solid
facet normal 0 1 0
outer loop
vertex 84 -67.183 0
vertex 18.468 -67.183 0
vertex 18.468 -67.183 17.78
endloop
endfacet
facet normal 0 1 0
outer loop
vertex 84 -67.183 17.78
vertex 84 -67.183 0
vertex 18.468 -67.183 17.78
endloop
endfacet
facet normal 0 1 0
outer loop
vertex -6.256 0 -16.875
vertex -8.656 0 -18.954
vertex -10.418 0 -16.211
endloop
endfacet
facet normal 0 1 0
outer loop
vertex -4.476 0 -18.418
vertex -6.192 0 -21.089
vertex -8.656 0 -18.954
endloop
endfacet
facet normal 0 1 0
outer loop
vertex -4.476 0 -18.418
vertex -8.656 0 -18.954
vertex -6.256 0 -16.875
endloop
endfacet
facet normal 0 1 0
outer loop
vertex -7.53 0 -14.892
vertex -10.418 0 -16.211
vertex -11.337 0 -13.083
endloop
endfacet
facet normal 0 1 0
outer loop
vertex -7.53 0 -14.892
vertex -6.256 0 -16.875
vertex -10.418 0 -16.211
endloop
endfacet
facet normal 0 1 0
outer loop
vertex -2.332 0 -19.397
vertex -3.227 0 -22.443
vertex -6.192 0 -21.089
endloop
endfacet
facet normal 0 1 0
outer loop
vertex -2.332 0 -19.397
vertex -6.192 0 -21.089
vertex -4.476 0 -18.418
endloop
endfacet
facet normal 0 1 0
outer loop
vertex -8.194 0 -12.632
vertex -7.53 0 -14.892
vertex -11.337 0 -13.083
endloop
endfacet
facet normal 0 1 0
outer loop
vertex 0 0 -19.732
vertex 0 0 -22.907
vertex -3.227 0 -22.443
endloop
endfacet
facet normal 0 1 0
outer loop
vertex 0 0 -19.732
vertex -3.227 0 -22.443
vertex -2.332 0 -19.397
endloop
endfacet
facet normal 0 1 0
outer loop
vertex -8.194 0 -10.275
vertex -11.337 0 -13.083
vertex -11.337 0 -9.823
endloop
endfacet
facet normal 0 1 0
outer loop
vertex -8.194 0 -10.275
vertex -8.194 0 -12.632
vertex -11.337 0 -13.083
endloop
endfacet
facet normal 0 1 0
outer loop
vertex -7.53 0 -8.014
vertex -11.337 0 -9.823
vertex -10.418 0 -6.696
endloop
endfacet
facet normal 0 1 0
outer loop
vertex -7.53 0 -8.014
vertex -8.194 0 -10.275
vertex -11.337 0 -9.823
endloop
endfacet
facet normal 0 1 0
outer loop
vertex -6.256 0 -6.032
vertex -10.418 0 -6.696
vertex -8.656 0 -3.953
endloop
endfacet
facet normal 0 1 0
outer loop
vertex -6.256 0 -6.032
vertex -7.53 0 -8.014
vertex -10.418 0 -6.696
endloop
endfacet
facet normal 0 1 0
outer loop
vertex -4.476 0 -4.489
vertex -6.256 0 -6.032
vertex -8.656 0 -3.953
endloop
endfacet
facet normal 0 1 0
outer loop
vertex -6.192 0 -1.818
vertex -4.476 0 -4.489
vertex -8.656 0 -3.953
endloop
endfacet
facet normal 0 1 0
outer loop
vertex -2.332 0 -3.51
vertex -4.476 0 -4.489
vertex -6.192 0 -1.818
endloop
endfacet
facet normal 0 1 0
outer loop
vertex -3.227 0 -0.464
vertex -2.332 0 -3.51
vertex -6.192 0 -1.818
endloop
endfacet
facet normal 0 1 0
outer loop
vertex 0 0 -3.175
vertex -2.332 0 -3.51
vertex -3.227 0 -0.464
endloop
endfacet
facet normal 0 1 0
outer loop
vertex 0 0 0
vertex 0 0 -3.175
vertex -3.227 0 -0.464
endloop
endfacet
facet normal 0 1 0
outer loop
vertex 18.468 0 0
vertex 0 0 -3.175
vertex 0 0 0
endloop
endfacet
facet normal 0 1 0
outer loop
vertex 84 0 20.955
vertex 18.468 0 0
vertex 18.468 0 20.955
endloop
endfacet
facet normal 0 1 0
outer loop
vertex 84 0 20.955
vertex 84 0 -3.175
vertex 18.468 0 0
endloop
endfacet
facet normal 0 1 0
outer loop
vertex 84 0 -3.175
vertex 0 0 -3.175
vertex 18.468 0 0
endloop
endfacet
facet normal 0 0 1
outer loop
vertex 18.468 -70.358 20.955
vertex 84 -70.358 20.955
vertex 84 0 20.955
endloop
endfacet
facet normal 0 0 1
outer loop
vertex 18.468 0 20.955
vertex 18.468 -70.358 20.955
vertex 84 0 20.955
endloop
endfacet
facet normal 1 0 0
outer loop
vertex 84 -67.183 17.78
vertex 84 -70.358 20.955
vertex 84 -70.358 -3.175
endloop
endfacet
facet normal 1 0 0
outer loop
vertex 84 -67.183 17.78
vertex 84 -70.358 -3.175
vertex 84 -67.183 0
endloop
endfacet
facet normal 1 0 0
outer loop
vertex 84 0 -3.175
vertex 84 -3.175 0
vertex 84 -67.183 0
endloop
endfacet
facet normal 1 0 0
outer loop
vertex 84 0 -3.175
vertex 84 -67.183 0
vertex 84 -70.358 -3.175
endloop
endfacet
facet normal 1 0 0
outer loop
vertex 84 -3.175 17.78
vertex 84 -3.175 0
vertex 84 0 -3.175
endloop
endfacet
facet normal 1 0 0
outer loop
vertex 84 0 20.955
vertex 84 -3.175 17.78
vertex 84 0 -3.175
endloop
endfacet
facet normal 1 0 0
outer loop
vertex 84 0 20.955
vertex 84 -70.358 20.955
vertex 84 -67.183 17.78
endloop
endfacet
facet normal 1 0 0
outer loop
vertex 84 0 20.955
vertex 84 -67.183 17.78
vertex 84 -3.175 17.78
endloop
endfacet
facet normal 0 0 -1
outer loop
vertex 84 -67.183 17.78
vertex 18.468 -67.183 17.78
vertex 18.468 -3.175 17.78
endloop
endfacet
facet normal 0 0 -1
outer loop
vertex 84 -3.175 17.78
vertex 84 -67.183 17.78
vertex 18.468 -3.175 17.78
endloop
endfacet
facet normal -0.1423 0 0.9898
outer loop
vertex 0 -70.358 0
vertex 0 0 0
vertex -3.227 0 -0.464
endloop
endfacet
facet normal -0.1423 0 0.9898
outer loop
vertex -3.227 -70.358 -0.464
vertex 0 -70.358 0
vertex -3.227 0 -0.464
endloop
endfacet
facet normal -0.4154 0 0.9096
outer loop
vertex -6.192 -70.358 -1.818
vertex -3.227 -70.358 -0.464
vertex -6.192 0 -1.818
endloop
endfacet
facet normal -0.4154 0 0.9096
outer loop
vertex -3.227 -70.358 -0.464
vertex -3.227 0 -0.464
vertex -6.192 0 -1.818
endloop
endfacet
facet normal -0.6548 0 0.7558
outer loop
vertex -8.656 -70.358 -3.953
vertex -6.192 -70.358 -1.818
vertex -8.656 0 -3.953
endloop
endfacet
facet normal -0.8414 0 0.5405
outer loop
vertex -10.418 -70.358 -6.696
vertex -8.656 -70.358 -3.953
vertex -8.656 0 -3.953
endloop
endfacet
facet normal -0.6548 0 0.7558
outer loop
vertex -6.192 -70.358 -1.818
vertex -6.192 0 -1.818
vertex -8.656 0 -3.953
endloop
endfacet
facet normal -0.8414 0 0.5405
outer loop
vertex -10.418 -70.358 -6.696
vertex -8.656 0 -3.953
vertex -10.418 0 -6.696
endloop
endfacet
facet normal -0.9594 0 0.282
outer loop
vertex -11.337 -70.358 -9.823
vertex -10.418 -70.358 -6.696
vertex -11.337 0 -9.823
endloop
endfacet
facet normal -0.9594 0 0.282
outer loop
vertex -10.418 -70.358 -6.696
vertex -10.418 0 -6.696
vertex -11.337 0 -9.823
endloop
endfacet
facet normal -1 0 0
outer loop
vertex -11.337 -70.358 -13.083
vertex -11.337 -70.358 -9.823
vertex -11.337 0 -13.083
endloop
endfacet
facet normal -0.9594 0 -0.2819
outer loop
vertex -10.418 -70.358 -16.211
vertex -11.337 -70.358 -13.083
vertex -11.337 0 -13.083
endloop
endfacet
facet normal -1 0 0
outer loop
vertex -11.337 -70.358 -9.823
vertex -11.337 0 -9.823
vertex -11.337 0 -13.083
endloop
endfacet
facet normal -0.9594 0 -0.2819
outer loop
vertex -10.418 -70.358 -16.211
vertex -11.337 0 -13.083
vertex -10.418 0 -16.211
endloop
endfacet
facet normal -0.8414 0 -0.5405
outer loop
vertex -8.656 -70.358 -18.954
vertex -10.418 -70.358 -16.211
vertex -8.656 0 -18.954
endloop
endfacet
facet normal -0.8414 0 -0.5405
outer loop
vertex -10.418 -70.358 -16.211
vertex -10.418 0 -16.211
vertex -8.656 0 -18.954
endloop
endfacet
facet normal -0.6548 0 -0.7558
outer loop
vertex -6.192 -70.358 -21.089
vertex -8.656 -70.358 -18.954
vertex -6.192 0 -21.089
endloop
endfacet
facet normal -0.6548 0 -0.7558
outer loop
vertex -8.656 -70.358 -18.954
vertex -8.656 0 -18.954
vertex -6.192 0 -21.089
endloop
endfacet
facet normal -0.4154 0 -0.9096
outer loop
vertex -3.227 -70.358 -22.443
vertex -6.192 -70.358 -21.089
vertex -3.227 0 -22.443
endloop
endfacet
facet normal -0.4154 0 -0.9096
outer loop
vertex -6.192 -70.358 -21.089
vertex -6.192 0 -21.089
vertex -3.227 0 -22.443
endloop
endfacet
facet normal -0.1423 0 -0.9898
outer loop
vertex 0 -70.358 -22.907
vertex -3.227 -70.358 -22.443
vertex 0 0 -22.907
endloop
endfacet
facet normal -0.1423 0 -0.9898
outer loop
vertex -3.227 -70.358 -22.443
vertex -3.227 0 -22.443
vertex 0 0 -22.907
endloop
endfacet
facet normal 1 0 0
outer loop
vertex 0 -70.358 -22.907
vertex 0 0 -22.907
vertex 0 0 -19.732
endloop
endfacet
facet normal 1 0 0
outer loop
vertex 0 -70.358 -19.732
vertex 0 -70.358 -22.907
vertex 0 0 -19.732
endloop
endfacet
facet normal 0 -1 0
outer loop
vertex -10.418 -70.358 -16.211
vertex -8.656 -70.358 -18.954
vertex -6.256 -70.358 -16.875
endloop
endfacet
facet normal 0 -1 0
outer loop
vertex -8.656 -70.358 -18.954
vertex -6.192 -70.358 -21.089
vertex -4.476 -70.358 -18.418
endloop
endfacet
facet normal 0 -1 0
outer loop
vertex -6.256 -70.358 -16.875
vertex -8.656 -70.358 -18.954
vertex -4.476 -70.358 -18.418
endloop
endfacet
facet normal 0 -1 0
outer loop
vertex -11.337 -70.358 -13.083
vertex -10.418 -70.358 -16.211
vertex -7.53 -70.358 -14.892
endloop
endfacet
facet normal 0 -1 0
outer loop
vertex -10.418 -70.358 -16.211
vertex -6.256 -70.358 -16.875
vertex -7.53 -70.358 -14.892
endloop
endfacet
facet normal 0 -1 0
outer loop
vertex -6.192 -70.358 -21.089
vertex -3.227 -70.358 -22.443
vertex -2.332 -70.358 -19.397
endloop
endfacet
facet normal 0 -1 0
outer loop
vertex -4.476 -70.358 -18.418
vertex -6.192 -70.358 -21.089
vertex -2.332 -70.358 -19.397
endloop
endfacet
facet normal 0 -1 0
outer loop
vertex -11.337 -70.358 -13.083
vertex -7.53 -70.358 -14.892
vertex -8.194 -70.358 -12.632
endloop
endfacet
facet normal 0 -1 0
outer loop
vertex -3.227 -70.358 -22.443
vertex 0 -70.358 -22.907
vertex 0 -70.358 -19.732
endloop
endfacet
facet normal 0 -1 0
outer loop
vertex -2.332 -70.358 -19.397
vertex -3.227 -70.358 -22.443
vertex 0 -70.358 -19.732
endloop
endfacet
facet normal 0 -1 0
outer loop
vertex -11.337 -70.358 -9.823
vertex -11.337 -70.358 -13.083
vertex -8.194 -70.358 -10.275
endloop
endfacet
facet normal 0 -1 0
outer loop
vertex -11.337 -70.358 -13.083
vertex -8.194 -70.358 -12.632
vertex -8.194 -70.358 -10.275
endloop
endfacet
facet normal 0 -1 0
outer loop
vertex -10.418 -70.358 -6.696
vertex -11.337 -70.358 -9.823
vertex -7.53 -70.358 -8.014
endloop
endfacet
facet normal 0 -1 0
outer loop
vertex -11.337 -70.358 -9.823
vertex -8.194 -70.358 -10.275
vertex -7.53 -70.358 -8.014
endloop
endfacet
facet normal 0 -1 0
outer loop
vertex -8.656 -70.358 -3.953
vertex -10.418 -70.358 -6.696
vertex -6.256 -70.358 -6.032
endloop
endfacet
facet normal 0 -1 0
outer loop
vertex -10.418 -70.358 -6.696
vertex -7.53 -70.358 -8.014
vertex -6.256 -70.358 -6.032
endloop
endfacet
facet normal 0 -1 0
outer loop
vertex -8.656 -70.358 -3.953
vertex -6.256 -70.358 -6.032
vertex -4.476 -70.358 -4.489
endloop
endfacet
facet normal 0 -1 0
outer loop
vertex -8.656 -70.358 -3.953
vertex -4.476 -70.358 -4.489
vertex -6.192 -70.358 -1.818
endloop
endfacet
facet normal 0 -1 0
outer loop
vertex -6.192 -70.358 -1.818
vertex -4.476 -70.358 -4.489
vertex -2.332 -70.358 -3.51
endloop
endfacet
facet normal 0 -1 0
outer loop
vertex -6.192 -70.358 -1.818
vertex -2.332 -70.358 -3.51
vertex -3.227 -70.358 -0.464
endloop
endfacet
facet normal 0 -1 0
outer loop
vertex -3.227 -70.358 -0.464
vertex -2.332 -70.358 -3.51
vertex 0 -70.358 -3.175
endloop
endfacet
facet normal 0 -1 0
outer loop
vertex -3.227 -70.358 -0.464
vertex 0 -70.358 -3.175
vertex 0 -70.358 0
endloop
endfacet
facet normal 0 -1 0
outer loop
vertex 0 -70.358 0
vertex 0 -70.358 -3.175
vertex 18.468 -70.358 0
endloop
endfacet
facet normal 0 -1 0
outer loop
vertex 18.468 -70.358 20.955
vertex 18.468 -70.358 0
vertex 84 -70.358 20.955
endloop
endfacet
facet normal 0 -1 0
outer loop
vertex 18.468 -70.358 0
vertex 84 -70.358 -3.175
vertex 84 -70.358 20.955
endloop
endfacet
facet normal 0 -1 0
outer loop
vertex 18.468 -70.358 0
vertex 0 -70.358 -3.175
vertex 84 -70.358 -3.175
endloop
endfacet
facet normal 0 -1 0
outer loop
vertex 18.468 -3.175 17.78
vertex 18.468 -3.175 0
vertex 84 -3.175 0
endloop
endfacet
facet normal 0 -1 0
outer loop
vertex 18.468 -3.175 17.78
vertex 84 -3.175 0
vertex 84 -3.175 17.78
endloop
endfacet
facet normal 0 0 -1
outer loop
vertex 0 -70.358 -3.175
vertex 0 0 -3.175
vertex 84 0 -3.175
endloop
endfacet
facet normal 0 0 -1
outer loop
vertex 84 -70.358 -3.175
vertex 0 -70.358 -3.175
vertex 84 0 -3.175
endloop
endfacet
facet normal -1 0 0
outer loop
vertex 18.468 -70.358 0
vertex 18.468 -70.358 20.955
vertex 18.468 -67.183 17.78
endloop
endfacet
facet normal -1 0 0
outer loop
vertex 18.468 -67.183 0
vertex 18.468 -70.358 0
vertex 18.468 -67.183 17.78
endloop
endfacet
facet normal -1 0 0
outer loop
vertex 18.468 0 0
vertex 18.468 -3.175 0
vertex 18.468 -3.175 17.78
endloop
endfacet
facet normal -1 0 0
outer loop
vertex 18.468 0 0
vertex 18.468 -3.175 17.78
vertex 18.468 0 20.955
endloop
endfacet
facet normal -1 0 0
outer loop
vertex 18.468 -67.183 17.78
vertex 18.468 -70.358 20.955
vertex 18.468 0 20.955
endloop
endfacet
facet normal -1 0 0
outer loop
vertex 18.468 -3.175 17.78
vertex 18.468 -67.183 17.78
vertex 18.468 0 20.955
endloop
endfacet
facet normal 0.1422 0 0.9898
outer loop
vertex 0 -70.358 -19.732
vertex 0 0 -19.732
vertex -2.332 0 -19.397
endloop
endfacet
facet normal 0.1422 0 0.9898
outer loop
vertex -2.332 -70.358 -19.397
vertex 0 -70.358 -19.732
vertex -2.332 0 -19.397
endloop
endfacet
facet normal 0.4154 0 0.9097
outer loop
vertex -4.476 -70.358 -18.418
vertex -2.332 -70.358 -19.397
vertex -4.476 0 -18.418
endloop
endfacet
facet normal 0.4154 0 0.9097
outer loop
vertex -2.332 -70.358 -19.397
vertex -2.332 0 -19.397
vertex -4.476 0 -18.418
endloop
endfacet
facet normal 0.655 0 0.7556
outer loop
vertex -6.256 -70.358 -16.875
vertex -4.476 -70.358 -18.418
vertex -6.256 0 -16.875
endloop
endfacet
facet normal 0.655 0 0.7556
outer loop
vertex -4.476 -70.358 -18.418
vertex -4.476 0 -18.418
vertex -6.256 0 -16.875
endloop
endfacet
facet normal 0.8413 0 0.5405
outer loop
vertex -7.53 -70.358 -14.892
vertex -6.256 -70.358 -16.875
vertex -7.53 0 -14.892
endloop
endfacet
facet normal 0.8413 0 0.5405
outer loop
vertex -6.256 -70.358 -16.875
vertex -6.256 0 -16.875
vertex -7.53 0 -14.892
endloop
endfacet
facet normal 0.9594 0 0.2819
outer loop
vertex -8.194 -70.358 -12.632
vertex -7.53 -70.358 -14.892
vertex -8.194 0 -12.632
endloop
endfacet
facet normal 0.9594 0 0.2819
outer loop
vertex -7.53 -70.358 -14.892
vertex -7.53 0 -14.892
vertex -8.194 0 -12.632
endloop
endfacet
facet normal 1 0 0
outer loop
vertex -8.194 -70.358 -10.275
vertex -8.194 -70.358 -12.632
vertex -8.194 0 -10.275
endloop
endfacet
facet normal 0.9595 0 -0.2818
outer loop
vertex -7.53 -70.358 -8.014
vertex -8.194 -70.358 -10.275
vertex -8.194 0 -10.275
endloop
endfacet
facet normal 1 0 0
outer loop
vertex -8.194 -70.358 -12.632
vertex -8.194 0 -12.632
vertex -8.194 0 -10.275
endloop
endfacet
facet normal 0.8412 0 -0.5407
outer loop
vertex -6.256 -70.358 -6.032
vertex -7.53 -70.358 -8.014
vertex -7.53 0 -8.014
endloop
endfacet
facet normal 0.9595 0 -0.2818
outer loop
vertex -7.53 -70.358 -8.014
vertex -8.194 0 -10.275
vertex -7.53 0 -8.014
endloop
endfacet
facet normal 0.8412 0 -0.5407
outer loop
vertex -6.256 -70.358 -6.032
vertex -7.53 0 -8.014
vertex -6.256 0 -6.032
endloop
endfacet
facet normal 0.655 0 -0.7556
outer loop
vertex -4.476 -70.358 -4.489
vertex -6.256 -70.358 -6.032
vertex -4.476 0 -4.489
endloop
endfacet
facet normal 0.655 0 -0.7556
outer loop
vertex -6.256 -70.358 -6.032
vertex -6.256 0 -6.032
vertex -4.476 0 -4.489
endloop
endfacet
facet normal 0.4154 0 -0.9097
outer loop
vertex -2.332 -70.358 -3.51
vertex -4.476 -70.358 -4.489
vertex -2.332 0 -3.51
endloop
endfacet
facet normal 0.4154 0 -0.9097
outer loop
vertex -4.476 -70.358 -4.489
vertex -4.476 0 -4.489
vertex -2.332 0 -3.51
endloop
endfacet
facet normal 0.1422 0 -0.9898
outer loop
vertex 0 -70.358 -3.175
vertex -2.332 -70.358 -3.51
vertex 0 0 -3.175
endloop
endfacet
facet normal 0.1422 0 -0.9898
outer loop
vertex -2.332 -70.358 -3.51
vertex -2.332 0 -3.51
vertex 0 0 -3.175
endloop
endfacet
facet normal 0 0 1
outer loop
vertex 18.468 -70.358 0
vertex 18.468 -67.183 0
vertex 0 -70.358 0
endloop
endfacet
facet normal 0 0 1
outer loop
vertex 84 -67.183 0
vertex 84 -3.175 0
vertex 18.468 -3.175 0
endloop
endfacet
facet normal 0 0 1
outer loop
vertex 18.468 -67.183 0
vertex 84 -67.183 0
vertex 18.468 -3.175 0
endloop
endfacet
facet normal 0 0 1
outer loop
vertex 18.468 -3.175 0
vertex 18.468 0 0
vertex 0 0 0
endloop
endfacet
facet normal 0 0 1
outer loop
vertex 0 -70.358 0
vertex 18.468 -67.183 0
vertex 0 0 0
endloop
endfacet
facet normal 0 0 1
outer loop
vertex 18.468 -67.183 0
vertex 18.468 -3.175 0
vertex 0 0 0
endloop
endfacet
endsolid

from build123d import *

# Parameters (mm, degrees)
F1_DEPTH = 70.358
F2_W     = 70.358
F2_H     = 20.955
F3_DEPTH = 65.532
F4_W     = 64.008
F4_H     = 17.78
F5_DEPTH = 93.472


with BuildPart() as f1:
    # F0 (on Front) → F1 (new body)
    with BuildSketch(Plane.XZ):
        with BuildLine():
            ThreePointArc((0, -19.731941), (-8.27847, -11.45347), (0, -3.175))
            Line((0, -3.175), (84, -3.175))
            Line((84, -3.175), (84, 0))
            Line((84, 0), (0, 0))
            ThreePointArc((0, 0), (-11.45347, -11.45347), (0, -22.906941))
            Line((0, -22.906941), (0, -19.731941))
        make_face()
    extrude(amount=F1_DEPTH)

    # F2 (on face) → F3 (join)
    with BuildSketch(Plane.YZ.offset(84)):
        with Locations((-35.179, 10.4775)):
            Rectangle(F2_W, F2_H)
    extrude(amount=-F3_DEPTH)

    # F4 (on face) → F5 (cut)
    with BuildSketch(Plane.YZ.offset(84)):
        with Locations((-35.179, 8.89)):
            Rectangle(F4_W, F4_H)
    extrude(amount=-F5_DEPTH, mode=Mode.SUBTRACT)


solid = f1.part
